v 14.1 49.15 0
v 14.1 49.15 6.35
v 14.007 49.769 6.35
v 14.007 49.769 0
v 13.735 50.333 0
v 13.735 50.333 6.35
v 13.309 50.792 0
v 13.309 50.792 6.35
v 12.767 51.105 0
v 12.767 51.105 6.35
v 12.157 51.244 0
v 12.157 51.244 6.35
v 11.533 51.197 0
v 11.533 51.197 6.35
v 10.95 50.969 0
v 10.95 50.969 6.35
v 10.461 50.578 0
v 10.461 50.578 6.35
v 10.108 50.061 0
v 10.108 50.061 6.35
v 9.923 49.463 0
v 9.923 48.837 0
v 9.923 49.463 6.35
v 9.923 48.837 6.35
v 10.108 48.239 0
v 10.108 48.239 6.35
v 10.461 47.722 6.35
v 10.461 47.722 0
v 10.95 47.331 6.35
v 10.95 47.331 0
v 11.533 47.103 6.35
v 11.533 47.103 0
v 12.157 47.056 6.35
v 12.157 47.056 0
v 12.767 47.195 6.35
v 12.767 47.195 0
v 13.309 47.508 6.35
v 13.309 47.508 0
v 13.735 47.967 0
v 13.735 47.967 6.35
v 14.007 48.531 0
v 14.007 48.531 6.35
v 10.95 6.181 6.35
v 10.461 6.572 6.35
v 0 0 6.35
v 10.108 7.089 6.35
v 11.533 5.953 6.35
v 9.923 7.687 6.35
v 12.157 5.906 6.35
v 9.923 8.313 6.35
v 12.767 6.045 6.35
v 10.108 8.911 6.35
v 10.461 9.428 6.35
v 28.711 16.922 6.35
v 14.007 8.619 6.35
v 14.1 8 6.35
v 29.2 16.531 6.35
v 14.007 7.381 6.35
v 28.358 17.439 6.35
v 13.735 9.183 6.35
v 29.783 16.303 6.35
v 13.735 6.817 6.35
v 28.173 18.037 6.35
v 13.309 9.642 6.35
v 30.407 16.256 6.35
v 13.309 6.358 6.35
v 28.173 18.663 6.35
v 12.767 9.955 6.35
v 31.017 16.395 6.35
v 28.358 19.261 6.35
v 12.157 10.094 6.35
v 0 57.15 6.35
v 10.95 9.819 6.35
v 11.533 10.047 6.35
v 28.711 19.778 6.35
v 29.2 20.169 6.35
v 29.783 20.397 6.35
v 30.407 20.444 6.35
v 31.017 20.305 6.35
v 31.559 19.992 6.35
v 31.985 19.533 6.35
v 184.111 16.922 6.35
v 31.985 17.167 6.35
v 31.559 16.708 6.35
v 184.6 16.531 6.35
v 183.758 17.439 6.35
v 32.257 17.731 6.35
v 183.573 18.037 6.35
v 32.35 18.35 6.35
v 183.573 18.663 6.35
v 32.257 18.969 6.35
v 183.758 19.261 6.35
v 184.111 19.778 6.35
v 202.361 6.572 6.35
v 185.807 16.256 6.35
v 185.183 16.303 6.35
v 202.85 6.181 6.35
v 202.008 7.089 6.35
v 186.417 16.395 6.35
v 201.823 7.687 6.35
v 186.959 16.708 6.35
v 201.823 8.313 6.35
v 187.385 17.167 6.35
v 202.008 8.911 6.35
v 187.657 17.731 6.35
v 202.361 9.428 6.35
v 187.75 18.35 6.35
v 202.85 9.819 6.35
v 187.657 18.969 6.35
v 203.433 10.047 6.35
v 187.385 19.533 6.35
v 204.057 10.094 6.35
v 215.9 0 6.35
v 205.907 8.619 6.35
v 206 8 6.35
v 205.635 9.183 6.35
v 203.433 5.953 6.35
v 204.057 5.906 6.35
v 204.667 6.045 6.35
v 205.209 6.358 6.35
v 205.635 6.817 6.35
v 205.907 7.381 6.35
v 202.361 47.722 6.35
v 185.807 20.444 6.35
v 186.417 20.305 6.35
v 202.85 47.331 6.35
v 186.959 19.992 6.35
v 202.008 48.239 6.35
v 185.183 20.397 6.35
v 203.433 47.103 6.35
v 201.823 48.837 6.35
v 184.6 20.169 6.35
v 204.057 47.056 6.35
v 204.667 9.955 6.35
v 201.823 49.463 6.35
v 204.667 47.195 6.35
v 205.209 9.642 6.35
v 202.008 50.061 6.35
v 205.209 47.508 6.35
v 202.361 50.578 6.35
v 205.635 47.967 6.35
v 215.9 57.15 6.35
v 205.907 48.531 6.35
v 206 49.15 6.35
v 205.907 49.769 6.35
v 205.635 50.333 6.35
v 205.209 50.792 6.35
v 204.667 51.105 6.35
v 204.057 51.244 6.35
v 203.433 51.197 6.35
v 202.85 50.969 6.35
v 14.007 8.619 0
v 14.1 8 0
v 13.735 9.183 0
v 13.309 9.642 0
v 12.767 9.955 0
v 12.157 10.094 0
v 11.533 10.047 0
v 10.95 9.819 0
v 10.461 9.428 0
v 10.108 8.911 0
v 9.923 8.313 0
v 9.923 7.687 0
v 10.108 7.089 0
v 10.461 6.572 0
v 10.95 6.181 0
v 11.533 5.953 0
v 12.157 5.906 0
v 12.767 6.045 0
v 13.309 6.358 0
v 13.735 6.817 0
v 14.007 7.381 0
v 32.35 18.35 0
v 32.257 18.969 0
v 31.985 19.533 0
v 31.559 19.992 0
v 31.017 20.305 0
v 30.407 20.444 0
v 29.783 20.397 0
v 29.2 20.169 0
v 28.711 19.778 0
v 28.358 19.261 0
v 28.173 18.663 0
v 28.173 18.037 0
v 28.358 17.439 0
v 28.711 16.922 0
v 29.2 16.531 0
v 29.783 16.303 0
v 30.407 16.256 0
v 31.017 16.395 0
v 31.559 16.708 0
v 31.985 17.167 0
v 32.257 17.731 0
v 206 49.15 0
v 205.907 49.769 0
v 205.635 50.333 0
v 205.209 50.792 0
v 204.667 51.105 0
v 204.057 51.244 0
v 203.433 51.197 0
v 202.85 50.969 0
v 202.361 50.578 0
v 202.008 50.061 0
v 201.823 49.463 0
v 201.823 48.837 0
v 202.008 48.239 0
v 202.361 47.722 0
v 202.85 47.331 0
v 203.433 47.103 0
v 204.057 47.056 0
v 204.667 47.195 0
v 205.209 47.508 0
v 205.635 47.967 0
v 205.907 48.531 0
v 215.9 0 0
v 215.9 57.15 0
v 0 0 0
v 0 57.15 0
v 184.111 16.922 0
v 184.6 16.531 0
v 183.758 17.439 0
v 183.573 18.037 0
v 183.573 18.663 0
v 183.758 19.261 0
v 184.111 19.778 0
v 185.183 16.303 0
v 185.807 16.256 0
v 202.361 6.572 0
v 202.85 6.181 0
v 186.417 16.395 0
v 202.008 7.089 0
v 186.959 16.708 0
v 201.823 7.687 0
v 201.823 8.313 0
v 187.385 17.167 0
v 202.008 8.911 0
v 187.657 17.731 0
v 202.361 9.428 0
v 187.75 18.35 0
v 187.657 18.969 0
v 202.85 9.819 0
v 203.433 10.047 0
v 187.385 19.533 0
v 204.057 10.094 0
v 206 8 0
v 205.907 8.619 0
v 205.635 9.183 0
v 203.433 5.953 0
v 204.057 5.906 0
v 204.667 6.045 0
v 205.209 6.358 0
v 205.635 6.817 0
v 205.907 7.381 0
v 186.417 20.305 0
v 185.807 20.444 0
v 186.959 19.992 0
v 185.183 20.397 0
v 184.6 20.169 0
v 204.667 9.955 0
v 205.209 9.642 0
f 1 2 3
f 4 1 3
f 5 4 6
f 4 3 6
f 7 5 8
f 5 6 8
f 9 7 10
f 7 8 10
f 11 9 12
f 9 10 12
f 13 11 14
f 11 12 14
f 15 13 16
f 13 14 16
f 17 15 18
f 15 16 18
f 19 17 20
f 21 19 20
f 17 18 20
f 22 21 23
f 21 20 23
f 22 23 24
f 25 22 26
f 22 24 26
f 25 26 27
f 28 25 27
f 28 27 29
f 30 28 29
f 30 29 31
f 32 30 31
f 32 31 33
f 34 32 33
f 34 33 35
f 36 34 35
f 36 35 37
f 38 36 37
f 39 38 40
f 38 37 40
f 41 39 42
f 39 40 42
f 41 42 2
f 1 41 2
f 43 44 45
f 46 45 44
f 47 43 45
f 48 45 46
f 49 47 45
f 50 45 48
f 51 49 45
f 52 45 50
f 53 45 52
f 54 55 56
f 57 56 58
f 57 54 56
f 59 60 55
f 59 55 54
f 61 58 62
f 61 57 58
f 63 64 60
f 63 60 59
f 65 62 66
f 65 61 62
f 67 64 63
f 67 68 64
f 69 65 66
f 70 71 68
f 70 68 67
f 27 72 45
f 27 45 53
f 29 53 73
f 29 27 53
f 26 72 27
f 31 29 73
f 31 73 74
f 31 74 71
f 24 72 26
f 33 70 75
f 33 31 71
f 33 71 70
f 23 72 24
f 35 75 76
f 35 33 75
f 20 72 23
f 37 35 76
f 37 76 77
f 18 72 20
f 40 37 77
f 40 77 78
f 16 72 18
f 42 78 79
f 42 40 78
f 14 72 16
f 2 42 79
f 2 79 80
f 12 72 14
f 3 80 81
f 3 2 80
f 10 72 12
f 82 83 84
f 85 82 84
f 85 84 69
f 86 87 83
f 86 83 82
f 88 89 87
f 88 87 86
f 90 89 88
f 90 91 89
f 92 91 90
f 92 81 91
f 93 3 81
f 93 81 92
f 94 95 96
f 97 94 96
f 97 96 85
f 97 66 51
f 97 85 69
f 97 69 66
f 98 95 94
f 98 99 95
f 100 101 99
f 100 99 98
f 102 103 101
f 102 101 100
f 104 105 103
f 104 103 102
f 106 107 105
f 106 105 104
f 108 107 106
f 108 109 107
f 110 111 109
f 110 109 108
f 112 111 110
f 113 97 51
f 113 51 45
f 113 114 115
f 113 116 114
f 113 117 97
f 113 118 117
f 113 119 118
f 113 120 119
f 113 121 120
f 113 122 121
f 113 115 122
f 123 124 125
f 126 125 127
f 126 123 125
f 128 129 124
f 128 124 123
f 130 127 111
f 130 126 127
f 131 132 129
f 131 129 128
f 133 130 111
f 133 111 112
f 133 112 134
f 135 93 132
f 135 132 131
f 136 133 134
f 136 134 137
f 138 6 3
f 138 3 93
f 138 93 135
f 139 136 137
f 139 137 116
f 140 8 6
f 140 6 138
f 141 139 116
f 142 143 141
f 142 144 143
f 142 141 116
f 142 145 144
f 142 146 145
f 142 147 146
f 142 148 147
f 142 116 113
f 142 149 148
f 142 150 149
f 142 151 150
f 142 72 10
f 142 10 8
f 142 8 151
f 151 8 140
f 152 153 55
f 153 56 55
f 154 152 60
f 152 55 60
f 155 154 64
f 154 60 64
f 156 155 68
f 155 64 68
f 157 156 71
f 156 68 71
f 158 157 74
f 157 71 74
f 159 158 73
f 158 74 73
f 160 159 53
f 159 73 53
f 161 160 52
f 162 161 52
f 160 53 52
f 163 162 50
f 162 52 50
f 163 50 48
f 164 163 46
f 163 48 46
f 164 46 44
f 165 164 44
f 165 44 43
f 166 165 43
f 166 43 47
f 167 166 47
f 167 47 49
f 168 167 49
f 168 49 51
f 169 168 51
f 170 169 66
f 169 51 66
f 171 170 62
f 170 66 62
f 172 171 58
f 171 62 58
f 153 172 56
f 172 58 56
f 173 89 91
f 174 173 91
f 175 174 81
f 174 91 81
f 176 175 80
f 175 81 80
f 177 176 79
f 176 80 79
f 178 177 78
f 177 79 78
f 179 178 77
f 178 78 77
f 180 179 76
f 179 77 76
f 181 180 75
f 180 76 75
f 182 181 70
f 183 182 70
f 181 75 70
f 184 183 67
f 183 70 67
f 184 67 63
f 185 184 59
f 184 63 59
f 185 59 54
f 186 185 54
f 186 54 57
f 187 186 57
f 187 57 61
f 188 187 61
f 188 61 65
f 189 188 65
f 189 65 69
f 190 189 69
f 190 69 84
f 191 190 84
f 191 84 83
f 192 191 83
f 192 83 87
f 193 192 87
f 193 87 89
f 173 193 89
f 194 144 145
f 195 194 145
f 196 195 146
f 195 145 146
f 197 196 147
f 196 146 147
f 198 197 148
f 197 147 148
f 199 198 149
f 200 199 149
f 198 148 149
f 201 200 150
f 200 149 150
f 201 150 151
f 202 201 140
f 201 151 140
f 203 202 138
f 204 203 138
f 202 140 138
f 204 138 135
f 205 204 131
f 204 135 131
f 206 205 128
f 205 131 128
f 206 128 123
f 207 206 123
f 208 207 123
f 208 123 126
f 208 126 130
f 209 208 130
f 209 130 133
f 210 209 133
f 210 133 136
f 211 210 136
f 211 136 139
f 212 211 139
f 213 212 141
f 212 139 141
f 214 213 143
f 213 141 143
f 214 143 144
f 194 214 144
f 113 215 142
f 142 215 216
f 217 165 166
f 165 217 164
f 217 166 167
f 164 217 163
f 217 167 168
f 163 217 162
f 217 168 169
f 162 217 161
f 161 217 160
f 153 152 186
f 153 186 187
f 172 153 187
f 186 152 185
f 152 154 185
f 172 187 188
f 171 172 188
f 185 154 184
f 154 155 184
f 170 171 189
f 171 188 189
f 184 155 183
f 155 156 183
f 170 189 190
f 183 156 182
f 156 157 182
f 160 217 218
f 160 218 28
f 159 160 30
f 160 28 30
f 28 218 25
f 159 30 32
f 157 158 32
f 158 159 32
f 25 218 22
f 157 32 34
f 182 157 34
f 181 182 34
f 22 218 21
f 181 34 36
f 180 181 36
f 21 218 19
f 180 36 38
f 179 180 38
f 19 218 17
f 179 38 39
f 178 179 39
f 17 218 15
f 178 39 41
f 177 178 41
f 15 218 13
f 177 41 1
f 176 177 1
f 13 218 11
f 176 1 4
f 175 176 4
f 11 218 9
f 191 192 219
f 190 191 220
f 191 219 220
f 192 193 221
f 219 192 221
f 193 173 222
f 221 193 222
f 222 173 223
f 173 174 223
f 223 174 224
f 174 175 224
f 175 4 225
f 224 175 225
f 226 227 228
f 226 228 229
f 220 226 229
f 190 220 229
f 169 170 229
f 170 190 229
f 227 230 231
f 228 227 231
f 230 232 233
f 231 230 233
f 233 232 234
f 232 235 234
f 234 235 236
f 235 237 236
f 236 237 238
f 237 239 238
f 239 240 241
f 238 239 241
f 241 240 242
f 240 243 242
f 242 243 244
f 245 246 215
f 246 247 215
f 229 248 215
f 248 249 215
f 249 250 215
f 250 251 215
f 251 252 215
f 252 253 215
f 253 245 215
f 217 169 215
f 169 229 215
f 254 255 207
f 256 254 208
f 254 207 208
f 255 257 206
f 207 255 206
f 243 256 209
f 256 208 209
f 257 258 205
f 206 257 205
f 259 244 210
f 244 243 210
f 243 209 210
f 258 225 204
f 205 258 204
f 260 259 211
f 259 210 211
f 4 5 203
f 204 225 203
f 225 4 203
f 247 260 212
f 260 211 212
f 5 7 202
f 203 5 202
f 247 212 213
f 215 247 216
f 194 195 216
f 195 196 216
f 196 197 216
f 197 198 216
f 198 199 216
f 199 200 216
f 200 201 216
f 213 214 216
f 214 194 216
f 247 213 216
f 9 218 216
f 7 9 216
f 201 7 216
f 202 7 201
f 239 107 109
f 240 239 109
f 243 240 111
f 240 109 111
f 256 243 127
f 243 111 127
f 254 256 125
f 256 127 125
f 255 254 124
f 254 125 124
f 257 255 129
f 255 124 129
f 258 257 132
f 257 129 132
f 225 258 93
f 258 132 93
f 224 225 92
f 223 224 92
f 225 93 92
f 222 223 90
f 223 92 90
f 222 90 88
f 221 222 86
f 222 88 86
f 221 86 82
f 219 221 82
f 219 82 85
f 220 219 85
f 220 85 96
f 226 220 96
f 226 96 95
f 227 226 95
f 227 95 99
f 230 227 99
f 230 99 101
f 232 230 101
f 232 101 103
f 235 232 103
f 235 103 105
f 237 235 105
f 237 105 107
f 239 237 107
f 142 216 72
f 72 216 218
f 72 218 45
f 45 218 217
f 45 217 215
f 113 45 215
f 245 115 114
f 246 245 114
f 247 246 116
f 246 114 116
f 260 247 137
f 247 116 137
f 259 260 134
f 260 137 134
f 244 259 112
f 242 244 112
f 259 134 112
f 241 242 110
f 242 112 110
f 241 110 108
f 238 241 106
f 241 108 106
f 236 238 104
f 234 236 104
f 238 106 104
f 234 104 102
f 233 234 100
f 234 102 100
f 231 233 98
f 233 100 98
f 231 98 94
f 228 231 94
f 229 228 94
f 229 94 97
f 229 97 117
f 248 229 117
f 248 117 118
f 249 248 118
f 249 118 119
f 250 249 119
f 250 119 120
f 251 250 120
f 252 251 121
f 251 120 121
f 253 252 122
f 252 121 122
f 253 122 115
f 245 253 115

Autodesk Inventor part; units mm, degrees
ref_plane "YZ Plane" through (0, 0, 0) normal (1, 0, 0) x (0, 1, 0)
ref_plane "XZ Plane" through (0, 0, 0) normal (0, 1, 0) x (-1, 0, 0)
ref_plane "XY Plane" through (0, 0, 0) normal (0, 0, 1) x (1, 0, 0)
sketch "Sketch1" plane through (0, 0, 0) normal (0, 0, 1) x (1, 0, 0)
  line L0 (0, 0) -> (215.9, 0)
  line L1 (215.9, 0) -> (215.9, 57.15)
  line L2 (215.9, 57.15) -> (0, 57.15)
  line L3 (0, 57.15) -> (0, 0)
  dimension "d0" = 215.9
  dimension "d1" = 57.15
extrude "Extrusion1" add sketch "Sketch1" along normal blind 6.35
sketch "Sketch2" plane through (0, 0, 6.35) normal (0, 0, 1) x (1, 0, 0)
  line L0 (0, 57.15) -> (0, 0) projected
  line L1 (0, 57.15) -> (0, 49.15)
  line L2 (0, 49.15) -> (12, 49.15)
  circle A0 centre (12, 49.15) radius 2.1
  line L3 (0, 0) -> (0, 8)
  line L4 (0, 8) -> (12, 8)
  circle A1 centre (12, 8) radius 2.1
  line L5 (215.9, 0) -> (215.9, 57.15) projected
  line L6 (215.9, 57.15) -> (215.9, 49.15)
  line L7 (215.9, 49.15) -> (203.9, 49.15)
  circle A2 centre (203.9, 49.15) radius 2.1
  line L8 (215.9, 0) -> (215.9, 8)
  line L9 (215.9, 8) -> (203.9, 8)
  circle A3 centre (203.9, 8) radius 2.1
  dimension "d4" = 8
  dimension "d5" = 12
  dimension "d6" = 4.2
  dimension "d7" = 8
  dimension "d8" = 12
  dimension "d9" = 4.2
  dimension "d10" = 12
  dimension "d11" = 4.2
  dimension "d12" = 12
  dimension "d13" = 4.2
extrude "Extrusion2" cut sketch "Sketch2" against normal through all
sketch "Sketch3" plane through (0, 0, 6.35) normal (0, 0, 1) x (1, 0, 0)
  line L0 (0, 0) -> (30.25, 0)
  line L1 (0, 0) -> (215.9, 0) projected
  line L2 (30.25, 0) -> (30.25, 18.35)
  circle A0 centre (30.25, 18.35) radius 2.1
  line L3 (215.9, 0) -> (185.65, 0)
  line L4 (185.65, 0) -> (185.65, 18.35)
  circle A1 centre (185.65, 18.35) radius 2.1
  dimension "d16" = 30.25
  dimension "d17" = 18.35
  dimension "d18" = 4.2
  dimension "d19" = 30.25
  dimension "d20" = 18.35
  dimension "d21" = 4.2
extrude "Extrusion3" cut sketch "Sketch3" against normal blind 25.4
properties part number "SideRail"
